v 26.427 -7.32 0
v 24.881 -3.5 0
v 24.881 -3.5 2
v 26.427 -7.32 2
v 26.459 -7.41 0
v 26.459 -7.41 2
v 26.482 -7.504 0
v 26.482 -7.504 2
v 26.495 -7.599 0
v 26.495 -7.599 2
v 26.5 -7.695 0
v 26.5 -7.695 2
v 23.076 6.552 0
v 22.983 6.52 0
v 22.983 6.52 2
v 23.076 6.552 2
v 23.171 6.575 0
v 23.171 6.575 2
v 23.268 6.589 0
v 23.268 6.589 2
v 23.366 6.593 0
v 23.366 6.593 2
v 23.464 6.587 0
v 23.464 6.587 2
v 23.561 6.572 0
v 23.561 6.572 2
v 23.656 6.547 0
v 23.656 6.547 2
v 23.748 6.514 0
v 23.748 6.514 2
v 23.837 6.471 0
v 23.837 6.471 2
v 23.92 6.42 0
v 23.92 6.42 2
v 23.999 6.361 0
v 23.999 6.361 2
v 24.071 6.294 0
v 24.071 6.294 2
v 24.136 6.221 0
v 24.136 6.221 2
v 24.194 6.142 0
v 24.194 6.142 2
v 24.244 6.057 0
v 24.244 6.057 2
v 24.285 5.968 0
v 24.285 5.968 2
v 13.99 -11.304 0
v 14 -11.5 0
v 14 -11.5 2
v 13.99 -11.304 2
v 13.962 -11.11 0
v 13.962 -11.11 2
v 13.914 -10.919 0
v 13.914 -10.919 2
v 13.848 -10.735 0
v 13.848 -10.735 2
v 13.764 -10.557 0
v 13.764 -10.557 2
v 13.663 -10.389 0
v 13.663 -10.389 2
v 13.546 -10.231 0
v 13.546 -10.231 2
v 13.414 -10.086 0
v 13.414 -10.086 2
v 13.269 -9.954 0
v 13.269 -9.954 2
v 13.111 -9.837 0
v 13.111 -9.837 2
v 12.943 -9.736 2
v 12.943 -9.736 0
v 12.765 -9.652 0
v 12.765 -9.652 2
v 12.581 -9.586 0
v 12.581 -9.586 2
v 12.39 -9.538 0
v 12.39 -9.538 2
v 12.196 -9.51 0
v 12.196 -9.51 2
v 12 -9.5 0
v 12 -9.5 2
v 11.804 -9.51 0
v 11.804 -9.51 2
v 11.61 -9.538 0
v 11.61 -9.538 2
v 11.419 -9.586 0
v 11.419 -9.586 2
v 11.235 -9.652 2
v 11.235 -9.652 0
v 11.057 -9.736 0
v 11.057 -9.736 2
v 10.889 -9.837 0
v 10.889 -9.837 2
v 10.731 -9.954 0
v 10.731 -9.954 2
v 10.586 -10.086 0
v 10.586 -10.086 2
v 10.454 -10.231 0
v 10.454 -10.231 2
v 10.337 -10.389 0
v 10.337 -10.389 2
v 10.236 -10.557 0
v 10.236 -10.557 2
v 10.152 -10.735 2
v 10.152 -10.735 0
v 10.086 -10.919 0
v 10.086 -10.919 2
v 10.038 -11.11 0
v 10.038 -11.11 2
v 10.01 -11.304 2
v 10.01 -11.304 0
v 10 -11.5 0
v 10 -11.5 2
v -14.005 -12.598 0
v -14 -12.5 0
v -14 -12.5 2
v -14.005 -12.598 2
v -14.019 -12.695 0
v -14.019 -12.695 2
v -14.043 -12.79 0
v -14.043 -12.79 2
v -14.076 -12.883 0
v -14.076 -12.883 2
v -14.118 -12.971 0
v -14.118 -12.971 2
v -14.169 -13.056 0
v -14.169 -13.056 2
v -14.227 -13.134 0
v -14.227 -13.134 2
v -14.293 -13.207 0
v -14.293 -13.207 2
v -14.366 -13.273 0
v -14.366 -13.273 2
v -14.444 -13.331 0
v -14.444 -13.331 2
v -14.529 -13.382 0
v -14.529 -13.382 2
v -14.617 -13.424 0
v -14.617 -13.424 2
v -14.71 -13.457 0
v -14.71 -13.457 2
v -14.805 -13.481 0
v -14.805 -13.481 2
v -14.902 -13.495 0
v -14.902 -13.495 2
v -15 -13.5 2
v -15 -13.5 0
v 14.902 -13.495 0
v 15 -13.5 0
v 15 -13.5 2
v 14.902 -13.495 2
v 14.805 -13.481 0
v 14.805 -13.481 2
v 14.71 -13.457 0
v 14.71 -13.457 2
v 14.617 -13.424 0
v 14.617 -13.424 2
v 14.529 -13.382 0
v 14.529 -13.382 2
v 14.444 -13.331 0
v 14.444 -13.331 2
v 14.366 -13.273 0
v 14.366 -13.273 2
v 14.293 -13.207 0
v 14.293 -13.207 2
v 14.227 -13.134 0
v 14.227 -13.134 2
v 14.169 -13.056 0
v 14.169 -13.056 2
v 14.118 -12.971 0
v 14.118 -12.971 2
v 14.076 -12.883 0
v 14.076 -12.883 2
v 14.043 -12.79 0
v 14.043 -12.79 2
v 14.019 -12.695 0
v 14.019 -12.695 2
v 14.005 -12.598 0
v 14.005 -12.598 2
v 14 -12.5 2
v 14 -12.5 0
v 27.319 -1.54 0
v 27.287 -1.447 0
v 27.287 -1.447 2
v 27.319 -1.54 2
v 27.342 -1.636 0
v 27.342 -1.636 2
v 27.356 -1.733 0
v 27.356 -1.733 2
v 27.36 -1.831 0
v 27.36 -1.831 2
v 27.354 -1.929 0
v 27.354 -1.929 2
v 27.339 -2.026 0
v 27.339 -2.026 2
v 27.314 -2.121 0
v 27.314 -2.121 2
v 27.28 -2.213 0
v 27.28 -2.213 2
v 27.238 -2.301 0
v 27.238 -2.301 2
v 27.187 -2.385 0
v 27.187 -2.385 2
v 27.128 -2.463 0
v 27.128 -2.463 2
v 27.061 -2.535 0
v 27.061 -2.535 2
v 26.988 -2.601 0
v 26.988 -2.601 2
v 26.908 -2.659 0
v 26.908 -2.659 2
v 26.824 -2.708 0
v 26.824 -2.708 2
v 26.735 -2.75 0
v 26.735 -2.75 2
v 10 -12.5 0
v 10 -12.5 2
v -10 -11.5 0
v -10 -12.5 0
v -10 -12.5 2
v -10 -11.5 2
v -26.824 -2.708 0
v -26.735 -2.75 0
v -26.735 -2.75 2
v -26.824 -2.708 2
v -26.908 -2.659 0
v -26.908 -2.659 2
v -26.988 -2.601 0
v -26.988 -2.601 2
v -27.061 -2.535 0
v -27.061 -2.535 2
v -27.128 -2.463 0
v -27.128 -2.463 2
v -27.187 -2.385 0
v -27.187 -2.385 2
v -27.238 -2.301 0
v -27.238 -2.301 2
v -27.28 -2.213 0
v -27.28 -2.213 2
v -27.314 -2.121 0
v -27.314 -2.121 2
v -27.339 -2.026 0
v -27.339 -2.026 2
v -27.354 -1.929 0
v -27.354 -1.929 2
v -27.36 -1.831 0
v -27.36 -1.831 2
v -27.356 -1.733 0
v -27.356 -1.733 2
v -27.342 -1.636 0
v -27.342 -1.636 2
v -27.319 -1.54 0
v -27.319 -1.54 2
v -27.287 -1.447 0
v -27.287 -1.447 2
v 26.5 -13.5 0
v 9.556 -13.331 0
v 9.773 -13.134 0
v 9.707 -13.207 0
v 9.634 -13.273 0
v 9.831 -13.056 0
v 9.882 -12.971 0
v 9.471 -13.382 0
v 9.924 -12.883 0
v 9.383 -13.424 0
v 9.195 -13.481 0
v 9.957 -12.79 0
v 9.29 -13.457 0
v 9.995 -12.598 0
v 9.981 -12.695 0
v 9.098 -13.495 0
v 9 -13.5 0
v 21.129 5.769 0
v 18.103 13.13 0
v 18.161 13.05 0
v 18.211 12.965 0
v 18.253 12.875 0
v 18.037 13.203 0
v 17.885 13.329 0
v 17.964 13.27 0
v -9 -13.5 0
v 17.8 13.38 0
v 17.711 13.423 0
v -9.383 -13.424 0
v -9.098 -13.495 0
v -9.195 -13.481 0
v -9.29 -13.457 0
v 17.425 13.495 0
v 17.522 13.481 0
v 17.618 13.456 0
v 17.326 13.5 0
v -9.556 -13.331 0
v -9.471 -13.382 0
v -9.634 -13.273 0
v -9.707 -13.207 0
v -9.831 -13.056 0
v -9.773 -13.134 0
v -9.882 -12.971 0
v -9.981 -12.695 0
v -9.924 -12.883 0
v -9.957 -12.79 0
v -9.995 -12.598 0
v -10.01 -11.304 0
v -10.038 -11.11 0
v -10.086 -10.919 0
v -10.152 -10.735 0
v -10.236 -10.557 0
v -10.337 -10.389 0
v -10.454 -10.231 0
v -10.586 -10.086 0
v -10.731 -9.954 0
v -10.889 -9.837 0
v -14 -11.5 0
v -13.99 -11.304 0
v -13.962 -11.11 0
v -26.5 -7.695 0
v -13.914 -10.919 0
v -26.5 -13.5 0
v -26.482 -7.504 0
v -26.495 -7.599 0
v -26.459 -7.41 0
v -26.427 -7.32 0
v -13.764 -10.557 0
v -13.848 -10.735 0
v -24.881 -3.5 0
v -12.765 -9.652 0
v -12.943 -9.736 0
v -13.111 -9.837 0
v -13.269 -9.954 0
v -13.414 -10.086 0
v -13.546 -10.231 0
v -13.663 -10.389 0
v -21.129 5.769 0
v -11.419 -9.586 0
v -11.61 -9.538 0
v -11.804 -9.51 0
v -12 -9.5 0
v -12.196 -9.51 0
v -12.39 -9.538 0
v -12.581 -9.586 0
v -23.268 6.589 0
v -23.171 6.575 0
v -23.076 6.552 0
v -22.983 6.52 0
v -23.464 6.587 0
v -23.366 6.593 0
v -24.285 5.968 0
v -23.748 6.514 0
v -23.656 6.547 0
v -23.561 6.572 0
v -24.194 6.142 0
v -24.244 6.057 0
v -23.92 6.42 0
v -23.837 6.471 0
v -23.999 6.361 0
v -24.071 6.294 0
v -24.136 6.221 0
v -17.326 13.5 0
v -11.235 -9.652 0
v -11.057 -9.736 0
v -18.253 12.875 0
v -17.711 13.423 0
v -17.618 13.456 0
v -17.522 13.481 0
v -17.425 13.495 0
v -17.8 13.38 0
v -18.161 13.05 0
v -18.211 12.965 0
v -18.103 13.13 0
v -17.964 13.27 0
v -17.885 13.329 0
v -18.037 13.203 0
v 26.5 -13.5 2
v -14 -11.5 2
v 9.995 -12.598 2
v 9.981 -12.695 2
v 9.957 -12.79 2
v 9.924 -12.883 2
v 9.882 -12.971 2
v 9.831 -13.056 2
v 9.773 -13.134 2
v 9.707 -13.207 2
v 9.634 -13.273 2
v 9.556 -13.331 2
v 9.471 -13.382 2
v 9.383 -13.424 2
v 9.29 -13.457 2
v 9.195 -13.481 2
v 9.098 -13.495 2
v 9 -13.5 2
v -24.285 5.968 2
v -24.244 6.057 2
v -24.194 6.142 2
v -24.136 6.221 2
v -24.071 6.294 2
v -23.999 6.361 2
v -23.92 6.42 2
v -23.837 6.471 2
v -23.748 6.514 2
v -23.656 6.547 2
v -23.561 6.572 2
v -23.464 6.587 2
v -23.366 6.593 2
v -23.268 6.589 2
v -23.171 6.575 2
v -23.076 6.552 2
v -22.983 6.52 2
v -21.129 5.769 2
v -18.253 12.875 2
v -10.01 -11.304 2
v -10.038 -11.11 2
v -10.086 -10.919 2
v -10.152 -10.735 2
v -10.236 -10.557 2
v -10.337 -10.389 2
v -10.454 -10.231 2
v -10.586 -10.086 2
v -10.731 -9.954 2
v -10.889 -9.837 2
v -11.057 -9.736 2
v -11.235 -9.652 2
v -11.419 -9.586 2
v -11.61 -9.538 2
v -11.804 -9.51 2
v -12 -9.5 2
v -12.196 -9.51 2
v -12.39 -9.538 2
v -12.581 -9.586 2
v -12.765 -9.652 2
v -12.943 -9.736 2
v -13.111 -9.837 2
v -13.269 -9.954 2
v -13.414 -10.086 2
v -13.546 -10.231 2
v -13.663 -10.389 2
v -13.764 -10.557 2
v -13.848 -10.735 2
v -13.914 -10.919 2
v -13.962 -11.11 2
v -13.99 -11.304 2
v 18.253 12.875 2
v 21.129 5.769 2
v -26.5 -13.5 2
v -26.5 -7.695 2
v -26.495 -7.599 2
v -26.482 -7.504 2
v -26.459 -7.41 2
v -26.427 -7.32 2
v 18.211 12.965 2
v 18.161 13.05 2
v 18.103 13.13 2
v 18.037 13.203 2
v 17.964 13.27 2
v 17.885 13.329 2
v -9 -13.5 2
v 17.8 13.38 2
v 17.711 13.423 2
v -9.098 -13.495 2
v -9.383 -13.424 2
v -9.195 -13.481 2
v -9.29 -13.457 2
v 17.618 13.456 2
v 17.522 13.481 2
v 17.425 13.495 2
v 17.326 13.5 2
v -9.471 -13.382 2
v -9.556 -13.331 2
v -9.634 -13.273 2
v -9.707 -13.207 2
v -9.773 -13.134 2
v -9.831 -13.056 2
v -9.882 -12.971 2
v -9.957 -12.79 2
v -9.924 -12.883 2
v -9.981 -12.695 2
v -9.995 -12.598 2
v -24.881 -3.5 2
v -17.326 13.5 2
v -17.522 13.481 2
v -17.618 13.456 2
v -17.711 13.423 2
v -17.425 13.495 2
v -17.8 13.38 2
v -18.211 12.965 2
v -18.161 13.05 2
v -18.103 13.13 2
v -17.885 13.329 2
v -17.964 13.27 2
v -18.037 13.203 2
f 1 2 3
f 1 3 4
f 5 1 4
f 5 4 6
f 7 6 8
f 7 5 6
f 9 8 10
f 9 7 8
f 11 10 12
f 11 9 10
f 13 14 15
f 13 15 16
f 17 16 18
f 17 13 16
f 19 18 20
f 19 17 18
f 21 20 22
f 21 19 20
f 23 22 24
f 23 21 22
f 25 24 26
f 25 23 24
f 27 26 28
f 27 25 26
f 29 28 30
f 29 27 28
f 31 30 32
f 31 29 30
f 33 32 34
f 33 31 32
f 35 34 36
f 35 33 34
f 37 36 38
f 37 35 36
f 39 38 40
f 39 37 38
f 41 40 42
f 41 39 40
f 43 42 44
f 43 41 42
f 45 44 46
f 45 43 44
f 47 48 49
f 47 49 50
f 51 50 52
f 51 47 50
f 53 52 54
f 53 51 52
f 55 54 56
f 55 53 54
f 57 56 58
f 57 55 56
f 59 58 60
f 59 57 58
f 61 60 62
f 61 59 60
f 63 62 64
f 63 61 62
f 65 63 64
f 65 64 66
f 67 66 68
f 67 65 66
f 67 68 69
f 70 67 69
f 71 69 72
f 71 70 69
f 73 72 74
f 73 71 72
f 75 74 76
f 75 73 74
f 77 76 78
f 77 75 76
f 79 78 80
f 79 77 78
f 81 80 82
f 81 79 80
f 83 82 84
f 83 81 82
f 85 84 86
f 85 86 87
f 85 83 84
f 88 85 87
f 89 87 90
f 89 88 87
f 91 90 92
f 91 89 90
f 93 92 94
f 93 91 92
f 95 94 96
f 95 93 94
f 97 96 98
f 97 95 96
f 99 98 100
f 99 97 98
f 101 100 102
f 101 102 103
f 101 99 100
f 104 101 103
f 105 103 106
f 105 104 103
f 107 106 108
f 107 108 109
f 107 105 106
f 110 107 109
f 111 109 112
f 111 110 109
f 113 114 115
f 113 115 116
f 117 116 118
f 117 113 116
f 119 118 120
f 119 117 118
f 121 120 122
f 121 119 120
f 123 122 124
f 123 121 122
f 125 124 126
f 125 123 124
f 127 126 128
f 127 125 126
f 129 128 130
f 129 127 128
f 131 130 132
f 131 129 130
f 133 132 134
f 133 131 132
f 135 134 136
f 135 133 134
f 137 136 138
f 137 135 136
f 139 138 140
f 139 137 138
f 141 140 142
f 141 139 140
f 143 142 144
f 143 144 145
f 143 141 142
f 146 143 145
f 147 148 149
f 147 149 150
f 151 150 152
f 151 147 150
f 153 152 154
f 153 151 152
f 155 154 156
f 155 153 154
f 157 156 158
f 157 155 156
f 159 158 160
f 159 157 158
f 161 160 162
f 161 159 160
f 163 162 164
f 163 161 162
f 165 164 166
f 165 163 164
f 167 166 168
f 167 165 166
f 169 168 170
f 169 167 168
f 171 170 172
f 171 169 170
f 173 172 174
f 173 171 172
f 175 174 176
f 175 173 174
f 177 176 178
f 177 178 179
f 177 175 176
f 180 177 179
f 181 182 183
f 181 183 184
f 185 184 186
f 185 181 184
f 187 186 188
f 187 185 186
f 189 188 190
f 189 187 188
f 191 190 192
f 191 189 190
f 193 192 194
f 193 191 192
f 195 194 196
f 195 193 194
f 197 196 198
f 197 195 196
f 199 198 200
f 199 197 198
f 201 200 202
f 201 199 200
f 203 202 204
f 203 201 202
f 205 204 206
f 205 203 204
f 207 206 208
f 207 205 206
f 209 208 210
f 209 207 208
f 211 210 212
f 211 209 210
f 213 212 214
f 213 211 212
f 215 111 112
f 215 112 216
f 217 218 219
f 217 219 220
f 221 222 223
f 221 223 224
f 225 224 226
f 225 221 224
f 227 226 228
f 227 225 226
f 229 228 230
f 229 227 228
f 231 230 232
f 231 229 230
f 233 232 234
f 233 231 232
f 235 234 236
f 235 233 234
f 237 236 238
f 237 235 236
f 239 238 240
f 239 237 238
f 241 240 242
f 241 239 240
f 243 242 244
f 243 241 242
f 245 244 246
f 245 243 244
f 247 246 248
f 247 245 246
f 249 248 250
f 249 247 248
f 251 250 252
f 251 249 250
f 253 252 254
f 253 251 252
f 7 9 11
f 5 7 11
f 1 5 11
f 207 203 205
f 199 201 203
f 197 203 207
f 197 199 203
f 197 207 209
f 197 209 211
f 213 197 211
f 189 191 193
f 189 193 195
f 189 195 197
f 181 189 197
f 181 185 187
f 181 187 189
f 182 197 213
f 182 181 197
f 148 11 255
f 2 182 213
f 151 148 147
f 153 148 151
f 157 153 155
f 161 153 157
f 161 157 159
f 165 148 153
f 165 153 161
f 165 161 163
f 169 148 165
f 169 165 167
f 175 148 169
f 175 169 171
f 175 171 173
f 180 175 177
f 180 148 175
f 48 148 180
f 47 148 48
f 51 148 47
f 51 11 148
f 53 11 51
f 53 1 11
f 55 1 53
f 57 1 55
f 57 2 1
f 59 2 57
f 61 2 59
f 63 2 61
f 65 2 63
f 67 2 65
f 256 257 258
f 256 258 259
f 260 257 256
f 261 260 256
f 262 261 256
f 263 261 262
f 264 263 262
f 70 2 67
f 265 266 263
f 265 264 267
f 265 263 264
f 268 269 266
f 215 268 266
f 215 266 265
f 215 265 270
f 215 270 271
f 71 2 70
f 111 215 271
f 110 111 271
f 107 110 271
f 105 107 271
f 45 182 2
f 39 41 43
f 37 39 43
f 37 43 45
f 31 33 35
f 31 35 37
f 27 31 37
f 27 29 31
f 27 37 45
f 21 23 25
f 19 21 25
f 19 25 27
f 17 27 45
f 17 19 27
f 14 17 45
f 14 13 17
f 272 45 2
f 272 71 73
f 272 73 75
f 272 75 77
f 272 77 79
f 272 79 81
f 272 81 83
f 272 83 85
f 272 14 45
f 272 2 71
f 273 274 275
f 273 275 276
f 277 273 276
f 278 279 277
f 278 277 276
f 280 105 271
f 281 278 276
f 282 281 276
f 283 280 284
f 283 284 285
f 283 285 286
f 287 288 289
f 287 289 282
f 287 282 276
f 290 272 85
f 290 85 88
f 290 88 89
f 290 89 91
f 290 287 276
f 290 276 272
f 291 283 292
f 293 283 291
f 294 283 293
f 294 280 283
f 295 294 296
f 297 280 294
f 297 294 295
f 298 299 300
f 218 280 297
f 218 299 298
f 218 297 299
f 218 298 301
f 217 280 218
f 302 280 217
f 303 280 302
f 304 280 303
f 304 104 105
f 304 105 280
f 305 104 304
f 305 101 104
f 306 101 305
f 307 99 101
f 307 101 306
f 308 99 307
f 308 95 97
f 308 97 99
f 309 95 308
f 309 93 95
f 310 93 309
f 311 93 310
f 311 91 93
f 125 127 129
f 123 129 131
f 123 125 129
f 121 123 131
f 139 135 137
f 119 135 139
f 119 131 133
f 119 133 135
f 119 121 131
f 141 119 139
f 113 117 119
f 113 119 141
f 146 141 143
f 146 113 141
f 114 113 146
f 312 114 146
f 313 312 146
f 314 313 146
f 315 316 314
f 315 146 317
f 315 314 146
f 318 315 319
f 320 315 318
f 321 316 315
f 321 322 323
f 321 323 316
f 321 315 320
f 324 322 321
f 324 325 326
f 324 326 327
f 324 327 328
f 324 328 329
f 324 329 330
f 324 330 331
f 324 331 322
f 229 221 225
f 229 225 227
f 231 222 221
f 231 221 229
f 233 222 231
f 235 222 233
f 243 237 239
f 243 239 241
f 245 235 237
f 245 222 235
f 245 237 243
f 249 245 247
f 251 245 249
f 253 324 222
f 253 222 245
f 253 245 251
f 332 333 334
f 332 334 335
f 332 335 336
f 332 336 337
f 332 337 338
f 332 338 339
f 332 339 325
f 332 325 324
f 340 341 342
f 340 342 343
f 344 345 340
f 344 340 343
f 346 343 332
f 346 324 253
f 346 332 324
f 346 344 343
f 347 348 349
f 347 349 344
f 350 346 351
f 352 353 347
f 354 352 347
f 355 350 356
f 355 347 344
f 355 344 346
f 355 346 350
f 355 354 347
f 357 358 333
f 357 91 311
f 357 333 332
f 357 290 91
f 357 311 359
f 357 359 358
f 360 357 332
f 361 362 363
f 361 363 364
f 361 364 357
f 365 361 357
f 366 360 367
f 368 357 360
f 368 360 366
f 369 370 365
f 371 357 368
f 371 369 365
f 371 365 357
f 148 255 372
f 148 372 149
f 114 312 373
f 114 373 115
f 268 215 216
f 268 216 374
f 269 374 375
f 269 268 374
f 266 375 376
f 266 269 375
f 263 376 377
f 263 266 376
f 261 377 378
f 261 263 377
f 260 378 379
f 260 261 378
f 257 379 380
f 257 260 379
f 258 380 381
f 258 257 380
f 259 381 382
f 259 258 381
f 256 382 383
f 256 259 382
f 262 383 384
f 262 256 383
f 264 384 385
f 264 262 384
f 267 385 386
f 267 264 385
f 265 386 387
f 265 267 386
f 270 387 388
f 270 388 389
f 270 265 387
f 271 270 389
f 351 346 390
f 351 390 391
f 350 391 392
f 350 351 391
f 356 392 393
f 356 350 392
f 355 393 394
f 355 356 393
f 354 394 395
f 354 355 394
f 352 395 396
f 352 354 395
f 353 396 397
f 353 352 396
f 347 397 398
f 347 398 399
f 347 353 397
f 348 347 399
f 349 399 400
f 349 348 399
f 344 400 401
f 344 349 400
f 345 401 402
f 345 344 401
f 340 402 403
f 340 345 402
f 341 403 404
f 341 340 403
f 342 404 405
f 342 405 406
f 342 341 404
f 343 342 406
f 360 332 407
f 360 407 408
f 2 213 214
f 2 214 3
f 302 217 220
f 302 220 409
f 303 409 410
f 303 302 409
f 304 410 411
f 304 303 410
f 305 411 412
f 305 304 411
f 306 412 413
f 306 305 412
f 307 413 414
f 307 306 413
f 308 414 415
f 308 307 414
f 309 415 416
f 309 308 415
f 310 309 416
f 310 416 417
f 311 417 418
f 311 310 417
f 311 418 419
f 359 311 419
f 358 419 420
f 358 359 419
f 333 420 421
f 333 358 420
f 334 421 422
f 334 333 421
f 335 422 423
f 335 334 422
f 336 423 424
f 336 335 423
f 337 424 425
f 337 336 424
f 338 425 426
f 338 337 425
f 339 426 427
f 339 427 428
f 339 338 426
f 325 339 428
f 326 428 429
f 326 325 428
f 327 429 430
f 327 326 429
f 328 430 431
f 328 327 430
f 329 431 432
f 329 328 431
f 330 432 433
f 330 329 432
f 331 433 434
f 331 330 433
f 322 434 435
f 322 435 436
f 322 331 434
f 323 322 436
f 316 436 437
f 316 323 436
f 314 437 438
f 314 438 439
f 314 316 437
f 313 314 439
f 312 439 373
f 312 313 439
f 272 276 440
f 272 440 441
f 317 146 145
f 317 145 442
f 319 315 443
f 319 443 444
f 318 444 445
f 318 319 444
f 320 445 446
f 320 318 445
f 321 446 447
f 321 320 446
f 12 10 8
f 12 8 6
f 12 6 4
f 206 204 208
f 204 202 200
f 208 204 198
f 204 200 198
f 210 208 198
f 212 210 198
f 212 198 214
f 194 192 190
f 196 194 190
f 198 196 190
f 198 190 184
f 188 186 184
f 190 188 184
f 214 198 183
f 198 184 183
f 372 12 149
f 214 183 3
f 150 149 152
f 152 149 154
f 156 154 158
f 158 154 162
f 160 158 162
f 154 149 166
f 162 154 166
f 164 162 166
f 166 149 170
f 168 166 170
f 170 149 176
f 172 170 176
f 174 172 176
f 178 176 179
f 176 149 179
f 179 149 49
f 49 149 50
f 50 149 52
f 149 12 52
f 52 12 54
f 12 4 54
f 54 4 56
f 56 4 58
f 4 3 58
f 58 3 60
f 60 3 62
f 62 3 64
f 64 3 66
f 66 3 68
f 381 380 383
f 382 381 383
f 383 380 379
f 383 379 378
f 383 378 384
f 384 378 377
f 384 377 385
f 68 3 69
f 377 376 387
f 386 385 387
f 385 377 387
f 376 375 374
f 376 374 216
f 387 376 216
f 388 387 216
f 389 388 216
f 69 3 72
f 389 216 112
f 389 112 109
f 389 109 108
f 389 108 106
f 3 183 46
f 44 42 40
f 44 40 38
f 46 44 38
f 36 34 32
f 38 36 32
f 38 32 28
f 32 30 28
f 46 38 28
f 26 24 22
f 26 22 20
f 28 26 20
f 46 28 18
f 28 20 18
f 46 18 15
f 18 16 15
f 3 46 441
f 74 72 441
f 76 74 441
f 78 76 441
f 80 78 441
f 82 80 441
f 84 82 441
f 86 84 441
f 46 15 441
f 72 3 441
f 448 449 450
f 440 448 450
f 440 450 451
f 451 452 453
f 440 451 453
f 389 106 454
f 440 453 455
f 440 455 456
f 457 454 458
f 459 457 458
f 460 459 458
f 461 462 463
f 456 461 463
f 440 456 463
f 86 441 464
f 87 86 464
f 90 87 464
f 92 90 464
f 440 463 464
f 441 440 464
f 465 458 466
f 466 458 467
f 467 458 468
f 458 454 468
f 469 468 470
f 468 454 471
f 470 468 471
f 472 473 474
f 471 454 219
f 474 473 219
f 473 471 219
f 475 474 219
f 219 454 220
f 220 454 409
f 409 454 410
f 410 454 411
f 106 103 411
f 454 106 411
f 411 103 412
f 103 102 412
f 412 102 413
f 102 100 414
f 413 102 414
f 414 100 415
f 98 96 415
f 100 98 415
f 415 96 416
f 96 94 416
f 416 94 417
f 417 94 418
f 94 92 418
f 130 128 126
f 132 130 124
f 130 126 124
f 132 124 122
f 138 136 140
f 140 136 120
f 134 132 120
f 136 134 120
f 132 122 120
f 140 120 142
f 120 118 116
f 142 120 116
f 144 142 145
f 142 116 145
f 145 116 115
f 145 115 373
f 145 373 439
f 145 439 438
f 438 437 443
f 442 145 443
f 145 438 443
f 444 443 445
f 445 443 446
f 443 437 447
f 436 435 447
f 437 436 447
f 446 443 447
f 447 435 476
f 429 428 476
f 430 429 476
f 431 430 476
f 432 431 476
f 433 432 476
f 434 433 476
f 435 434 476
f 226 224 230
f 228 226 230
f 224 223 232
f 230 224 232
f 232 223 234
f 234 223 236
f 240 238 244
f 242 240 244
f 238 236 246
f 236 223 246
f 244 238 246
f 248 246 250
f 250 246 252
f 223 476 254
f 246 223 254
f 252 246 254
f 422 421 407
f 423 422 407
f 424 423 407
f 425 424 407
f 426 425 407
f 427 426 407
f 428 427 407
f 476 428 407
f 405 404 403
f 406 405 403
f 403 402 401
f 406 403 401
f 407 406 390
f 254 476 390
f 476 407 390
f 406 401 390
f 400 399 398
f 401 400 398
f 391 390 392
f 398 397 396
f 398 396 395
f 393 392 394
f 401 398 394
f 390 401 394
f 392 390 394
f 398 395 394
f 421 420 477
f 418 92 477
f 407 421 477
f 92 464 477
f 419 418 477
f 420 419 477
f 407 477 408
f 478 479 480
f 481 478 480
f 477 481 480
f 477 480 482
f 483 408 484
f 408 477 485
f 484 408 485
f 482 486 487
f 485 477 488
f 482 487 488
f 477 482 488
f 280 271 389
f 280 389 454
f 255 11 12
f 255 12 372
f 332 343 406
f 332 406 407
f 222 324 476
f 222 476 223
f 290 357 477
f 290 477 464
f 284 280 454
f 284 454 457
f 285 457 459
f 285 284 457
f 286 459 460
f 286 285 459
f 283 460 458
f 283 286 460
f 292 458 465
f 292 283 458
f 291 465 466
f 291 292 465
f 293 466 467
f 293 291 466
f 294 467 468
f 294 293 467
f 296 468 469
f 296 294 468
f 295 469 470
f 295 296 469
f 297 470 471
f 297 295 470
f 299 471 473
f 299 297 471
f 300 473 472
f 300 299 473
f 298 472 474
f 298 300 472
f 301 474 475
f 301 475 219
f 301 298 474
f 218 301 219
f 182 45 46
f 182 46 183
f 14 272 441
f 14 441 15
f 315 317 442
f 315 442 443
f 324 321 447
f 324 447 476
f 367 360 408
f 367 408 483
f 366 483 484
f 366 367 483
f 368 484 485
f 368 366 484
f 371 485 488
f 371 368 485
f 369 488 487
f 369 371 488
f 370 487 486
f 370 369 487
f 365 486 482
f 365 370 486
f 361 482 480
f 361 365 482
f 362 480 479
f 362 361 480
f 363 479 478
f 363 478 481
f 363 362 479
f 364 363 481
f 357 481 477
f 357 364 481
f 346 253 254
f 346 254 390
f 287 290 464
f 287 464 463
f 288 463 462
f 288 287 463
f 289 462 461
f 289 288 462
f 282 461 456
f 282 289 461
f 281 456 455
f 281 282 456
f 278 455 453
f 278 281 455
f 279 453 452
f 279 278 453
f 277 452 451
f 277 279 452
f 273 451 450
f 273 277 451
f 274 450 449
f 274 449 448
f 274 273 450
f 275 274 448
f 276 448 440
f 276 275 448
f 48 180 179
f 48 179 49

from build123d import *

# Parameters (mm, degrees)
RESSALTO_EXTRUS_O1_DEPTH = 2


with BuildPart() as part:
    # Esboço1 → Ressalto-extrusão1 (new body)
    with BuildSketch(Plane.XY):
        with BuildLine():
            Line((-26.426946813, -7.319515656), (-24.880952381, -3.5))
            Line((-24.880952381, -3.5), (-26.734846007, -2.749614485))
            ThreePointArc((-26.734846007, -2.749614485), (-27.28040497, -2.212816705), (-27.286600063, -1.447474914))
            Line((-27.286600063, -1.447474914), (-24.285058001, 5.968099592))
            ThreePointArc((-24.285058001, 5.968099592), (-23.748260222, 6.513658555), (-22.98291843, 6.519853648))
            Line((-22.98291843, 6.519853648), (-21.129024804, 5.769468132))
            Line((-21.129024804, 5.769468132), (-18.252898169, 12.875192758))
            ThreePointArc((-18.252898169, 12.875192758), (-17.88488214, 13.329214314), (-17.325951356, 13.5))
            Line((-17.325951356, 13.5), (17.325951356, 13.5))
            ThreePointArc((17.325951356, 13.5), (17.88488214, 13.329214314), (18.252898169, 12.875192758))
            Line((18.252898169, 12.875192758), (21.129024804, 5.769468132))
            Line((21.129024804, 5.769468132), (22.98291843, 6.519853648))
            ThreePointArc((22.98291843, 6.519853648), (23.748260222, 6.513658555), (24.285058001, 5.968099592))
            Line((24.285058001, 5.968099592), (27.286600063, -1.447474914))
            ThreePointArc((27.286600063, -1.447474914), (27.28040497, -2.212816705), (26.734846007, -2.749614485))
            Line((26.734846007, -2.749614485), (24.880952381, -3.5))
            Line((24.880952381, -3.5), (26.426946813, -7.319515656))
            ThreePointArc((26.426946813, -7.319515656), (26.481566812, -7.503589097), (26.5, -7.694708414))
            Line((26.5, -7.694708414), (26.5, -13.5))
            Line((26.5, -13.5), (15, -13.5))
            ThreePointArc((15, -13.5), (14.292893219, -13.207106781), (14, -12.5))
            Line((14, -12.5), (14, -11.5))
            ThreePointArc((14, -11.5), (12, -9.5), (10, -11.5))
            Line((10, -11.5), (10, -12.5))
            ThreePointArc((10, -12.5), (9.707106781, -13.207106781), (9, -13.5))
            Line((9, -13.5), (-9, -13.5))
            ThreePointArc((-9, -13.5), (-9.707106781, -13.207106781), (-10, -12.5))
            Line((-10, -12.5), (-10, -11.5))
            ThreePointArc((-10, -11.5), (-12, -9.5), (-14, -11.5))
            Line((-14, -11.5), (-14, -12.5))
            ThreePointArc((-14, -12.5), (-14.292893219, -13.207106781), (-15, -13.5))
            Line((-15, -13.5), (-26.5, -13.5))
            Line((-26.5, -13.5), (-26.5, -7.694708414))
            ThreePointArc((-26.5, -7.694708414), (-26.481566812, -7.503589097), (-26.426946813, -7.319515656))
        make_face()
    extrude(amount=RESSALTO_EXTRUS_O1_DEPTH)


solid = part.part
